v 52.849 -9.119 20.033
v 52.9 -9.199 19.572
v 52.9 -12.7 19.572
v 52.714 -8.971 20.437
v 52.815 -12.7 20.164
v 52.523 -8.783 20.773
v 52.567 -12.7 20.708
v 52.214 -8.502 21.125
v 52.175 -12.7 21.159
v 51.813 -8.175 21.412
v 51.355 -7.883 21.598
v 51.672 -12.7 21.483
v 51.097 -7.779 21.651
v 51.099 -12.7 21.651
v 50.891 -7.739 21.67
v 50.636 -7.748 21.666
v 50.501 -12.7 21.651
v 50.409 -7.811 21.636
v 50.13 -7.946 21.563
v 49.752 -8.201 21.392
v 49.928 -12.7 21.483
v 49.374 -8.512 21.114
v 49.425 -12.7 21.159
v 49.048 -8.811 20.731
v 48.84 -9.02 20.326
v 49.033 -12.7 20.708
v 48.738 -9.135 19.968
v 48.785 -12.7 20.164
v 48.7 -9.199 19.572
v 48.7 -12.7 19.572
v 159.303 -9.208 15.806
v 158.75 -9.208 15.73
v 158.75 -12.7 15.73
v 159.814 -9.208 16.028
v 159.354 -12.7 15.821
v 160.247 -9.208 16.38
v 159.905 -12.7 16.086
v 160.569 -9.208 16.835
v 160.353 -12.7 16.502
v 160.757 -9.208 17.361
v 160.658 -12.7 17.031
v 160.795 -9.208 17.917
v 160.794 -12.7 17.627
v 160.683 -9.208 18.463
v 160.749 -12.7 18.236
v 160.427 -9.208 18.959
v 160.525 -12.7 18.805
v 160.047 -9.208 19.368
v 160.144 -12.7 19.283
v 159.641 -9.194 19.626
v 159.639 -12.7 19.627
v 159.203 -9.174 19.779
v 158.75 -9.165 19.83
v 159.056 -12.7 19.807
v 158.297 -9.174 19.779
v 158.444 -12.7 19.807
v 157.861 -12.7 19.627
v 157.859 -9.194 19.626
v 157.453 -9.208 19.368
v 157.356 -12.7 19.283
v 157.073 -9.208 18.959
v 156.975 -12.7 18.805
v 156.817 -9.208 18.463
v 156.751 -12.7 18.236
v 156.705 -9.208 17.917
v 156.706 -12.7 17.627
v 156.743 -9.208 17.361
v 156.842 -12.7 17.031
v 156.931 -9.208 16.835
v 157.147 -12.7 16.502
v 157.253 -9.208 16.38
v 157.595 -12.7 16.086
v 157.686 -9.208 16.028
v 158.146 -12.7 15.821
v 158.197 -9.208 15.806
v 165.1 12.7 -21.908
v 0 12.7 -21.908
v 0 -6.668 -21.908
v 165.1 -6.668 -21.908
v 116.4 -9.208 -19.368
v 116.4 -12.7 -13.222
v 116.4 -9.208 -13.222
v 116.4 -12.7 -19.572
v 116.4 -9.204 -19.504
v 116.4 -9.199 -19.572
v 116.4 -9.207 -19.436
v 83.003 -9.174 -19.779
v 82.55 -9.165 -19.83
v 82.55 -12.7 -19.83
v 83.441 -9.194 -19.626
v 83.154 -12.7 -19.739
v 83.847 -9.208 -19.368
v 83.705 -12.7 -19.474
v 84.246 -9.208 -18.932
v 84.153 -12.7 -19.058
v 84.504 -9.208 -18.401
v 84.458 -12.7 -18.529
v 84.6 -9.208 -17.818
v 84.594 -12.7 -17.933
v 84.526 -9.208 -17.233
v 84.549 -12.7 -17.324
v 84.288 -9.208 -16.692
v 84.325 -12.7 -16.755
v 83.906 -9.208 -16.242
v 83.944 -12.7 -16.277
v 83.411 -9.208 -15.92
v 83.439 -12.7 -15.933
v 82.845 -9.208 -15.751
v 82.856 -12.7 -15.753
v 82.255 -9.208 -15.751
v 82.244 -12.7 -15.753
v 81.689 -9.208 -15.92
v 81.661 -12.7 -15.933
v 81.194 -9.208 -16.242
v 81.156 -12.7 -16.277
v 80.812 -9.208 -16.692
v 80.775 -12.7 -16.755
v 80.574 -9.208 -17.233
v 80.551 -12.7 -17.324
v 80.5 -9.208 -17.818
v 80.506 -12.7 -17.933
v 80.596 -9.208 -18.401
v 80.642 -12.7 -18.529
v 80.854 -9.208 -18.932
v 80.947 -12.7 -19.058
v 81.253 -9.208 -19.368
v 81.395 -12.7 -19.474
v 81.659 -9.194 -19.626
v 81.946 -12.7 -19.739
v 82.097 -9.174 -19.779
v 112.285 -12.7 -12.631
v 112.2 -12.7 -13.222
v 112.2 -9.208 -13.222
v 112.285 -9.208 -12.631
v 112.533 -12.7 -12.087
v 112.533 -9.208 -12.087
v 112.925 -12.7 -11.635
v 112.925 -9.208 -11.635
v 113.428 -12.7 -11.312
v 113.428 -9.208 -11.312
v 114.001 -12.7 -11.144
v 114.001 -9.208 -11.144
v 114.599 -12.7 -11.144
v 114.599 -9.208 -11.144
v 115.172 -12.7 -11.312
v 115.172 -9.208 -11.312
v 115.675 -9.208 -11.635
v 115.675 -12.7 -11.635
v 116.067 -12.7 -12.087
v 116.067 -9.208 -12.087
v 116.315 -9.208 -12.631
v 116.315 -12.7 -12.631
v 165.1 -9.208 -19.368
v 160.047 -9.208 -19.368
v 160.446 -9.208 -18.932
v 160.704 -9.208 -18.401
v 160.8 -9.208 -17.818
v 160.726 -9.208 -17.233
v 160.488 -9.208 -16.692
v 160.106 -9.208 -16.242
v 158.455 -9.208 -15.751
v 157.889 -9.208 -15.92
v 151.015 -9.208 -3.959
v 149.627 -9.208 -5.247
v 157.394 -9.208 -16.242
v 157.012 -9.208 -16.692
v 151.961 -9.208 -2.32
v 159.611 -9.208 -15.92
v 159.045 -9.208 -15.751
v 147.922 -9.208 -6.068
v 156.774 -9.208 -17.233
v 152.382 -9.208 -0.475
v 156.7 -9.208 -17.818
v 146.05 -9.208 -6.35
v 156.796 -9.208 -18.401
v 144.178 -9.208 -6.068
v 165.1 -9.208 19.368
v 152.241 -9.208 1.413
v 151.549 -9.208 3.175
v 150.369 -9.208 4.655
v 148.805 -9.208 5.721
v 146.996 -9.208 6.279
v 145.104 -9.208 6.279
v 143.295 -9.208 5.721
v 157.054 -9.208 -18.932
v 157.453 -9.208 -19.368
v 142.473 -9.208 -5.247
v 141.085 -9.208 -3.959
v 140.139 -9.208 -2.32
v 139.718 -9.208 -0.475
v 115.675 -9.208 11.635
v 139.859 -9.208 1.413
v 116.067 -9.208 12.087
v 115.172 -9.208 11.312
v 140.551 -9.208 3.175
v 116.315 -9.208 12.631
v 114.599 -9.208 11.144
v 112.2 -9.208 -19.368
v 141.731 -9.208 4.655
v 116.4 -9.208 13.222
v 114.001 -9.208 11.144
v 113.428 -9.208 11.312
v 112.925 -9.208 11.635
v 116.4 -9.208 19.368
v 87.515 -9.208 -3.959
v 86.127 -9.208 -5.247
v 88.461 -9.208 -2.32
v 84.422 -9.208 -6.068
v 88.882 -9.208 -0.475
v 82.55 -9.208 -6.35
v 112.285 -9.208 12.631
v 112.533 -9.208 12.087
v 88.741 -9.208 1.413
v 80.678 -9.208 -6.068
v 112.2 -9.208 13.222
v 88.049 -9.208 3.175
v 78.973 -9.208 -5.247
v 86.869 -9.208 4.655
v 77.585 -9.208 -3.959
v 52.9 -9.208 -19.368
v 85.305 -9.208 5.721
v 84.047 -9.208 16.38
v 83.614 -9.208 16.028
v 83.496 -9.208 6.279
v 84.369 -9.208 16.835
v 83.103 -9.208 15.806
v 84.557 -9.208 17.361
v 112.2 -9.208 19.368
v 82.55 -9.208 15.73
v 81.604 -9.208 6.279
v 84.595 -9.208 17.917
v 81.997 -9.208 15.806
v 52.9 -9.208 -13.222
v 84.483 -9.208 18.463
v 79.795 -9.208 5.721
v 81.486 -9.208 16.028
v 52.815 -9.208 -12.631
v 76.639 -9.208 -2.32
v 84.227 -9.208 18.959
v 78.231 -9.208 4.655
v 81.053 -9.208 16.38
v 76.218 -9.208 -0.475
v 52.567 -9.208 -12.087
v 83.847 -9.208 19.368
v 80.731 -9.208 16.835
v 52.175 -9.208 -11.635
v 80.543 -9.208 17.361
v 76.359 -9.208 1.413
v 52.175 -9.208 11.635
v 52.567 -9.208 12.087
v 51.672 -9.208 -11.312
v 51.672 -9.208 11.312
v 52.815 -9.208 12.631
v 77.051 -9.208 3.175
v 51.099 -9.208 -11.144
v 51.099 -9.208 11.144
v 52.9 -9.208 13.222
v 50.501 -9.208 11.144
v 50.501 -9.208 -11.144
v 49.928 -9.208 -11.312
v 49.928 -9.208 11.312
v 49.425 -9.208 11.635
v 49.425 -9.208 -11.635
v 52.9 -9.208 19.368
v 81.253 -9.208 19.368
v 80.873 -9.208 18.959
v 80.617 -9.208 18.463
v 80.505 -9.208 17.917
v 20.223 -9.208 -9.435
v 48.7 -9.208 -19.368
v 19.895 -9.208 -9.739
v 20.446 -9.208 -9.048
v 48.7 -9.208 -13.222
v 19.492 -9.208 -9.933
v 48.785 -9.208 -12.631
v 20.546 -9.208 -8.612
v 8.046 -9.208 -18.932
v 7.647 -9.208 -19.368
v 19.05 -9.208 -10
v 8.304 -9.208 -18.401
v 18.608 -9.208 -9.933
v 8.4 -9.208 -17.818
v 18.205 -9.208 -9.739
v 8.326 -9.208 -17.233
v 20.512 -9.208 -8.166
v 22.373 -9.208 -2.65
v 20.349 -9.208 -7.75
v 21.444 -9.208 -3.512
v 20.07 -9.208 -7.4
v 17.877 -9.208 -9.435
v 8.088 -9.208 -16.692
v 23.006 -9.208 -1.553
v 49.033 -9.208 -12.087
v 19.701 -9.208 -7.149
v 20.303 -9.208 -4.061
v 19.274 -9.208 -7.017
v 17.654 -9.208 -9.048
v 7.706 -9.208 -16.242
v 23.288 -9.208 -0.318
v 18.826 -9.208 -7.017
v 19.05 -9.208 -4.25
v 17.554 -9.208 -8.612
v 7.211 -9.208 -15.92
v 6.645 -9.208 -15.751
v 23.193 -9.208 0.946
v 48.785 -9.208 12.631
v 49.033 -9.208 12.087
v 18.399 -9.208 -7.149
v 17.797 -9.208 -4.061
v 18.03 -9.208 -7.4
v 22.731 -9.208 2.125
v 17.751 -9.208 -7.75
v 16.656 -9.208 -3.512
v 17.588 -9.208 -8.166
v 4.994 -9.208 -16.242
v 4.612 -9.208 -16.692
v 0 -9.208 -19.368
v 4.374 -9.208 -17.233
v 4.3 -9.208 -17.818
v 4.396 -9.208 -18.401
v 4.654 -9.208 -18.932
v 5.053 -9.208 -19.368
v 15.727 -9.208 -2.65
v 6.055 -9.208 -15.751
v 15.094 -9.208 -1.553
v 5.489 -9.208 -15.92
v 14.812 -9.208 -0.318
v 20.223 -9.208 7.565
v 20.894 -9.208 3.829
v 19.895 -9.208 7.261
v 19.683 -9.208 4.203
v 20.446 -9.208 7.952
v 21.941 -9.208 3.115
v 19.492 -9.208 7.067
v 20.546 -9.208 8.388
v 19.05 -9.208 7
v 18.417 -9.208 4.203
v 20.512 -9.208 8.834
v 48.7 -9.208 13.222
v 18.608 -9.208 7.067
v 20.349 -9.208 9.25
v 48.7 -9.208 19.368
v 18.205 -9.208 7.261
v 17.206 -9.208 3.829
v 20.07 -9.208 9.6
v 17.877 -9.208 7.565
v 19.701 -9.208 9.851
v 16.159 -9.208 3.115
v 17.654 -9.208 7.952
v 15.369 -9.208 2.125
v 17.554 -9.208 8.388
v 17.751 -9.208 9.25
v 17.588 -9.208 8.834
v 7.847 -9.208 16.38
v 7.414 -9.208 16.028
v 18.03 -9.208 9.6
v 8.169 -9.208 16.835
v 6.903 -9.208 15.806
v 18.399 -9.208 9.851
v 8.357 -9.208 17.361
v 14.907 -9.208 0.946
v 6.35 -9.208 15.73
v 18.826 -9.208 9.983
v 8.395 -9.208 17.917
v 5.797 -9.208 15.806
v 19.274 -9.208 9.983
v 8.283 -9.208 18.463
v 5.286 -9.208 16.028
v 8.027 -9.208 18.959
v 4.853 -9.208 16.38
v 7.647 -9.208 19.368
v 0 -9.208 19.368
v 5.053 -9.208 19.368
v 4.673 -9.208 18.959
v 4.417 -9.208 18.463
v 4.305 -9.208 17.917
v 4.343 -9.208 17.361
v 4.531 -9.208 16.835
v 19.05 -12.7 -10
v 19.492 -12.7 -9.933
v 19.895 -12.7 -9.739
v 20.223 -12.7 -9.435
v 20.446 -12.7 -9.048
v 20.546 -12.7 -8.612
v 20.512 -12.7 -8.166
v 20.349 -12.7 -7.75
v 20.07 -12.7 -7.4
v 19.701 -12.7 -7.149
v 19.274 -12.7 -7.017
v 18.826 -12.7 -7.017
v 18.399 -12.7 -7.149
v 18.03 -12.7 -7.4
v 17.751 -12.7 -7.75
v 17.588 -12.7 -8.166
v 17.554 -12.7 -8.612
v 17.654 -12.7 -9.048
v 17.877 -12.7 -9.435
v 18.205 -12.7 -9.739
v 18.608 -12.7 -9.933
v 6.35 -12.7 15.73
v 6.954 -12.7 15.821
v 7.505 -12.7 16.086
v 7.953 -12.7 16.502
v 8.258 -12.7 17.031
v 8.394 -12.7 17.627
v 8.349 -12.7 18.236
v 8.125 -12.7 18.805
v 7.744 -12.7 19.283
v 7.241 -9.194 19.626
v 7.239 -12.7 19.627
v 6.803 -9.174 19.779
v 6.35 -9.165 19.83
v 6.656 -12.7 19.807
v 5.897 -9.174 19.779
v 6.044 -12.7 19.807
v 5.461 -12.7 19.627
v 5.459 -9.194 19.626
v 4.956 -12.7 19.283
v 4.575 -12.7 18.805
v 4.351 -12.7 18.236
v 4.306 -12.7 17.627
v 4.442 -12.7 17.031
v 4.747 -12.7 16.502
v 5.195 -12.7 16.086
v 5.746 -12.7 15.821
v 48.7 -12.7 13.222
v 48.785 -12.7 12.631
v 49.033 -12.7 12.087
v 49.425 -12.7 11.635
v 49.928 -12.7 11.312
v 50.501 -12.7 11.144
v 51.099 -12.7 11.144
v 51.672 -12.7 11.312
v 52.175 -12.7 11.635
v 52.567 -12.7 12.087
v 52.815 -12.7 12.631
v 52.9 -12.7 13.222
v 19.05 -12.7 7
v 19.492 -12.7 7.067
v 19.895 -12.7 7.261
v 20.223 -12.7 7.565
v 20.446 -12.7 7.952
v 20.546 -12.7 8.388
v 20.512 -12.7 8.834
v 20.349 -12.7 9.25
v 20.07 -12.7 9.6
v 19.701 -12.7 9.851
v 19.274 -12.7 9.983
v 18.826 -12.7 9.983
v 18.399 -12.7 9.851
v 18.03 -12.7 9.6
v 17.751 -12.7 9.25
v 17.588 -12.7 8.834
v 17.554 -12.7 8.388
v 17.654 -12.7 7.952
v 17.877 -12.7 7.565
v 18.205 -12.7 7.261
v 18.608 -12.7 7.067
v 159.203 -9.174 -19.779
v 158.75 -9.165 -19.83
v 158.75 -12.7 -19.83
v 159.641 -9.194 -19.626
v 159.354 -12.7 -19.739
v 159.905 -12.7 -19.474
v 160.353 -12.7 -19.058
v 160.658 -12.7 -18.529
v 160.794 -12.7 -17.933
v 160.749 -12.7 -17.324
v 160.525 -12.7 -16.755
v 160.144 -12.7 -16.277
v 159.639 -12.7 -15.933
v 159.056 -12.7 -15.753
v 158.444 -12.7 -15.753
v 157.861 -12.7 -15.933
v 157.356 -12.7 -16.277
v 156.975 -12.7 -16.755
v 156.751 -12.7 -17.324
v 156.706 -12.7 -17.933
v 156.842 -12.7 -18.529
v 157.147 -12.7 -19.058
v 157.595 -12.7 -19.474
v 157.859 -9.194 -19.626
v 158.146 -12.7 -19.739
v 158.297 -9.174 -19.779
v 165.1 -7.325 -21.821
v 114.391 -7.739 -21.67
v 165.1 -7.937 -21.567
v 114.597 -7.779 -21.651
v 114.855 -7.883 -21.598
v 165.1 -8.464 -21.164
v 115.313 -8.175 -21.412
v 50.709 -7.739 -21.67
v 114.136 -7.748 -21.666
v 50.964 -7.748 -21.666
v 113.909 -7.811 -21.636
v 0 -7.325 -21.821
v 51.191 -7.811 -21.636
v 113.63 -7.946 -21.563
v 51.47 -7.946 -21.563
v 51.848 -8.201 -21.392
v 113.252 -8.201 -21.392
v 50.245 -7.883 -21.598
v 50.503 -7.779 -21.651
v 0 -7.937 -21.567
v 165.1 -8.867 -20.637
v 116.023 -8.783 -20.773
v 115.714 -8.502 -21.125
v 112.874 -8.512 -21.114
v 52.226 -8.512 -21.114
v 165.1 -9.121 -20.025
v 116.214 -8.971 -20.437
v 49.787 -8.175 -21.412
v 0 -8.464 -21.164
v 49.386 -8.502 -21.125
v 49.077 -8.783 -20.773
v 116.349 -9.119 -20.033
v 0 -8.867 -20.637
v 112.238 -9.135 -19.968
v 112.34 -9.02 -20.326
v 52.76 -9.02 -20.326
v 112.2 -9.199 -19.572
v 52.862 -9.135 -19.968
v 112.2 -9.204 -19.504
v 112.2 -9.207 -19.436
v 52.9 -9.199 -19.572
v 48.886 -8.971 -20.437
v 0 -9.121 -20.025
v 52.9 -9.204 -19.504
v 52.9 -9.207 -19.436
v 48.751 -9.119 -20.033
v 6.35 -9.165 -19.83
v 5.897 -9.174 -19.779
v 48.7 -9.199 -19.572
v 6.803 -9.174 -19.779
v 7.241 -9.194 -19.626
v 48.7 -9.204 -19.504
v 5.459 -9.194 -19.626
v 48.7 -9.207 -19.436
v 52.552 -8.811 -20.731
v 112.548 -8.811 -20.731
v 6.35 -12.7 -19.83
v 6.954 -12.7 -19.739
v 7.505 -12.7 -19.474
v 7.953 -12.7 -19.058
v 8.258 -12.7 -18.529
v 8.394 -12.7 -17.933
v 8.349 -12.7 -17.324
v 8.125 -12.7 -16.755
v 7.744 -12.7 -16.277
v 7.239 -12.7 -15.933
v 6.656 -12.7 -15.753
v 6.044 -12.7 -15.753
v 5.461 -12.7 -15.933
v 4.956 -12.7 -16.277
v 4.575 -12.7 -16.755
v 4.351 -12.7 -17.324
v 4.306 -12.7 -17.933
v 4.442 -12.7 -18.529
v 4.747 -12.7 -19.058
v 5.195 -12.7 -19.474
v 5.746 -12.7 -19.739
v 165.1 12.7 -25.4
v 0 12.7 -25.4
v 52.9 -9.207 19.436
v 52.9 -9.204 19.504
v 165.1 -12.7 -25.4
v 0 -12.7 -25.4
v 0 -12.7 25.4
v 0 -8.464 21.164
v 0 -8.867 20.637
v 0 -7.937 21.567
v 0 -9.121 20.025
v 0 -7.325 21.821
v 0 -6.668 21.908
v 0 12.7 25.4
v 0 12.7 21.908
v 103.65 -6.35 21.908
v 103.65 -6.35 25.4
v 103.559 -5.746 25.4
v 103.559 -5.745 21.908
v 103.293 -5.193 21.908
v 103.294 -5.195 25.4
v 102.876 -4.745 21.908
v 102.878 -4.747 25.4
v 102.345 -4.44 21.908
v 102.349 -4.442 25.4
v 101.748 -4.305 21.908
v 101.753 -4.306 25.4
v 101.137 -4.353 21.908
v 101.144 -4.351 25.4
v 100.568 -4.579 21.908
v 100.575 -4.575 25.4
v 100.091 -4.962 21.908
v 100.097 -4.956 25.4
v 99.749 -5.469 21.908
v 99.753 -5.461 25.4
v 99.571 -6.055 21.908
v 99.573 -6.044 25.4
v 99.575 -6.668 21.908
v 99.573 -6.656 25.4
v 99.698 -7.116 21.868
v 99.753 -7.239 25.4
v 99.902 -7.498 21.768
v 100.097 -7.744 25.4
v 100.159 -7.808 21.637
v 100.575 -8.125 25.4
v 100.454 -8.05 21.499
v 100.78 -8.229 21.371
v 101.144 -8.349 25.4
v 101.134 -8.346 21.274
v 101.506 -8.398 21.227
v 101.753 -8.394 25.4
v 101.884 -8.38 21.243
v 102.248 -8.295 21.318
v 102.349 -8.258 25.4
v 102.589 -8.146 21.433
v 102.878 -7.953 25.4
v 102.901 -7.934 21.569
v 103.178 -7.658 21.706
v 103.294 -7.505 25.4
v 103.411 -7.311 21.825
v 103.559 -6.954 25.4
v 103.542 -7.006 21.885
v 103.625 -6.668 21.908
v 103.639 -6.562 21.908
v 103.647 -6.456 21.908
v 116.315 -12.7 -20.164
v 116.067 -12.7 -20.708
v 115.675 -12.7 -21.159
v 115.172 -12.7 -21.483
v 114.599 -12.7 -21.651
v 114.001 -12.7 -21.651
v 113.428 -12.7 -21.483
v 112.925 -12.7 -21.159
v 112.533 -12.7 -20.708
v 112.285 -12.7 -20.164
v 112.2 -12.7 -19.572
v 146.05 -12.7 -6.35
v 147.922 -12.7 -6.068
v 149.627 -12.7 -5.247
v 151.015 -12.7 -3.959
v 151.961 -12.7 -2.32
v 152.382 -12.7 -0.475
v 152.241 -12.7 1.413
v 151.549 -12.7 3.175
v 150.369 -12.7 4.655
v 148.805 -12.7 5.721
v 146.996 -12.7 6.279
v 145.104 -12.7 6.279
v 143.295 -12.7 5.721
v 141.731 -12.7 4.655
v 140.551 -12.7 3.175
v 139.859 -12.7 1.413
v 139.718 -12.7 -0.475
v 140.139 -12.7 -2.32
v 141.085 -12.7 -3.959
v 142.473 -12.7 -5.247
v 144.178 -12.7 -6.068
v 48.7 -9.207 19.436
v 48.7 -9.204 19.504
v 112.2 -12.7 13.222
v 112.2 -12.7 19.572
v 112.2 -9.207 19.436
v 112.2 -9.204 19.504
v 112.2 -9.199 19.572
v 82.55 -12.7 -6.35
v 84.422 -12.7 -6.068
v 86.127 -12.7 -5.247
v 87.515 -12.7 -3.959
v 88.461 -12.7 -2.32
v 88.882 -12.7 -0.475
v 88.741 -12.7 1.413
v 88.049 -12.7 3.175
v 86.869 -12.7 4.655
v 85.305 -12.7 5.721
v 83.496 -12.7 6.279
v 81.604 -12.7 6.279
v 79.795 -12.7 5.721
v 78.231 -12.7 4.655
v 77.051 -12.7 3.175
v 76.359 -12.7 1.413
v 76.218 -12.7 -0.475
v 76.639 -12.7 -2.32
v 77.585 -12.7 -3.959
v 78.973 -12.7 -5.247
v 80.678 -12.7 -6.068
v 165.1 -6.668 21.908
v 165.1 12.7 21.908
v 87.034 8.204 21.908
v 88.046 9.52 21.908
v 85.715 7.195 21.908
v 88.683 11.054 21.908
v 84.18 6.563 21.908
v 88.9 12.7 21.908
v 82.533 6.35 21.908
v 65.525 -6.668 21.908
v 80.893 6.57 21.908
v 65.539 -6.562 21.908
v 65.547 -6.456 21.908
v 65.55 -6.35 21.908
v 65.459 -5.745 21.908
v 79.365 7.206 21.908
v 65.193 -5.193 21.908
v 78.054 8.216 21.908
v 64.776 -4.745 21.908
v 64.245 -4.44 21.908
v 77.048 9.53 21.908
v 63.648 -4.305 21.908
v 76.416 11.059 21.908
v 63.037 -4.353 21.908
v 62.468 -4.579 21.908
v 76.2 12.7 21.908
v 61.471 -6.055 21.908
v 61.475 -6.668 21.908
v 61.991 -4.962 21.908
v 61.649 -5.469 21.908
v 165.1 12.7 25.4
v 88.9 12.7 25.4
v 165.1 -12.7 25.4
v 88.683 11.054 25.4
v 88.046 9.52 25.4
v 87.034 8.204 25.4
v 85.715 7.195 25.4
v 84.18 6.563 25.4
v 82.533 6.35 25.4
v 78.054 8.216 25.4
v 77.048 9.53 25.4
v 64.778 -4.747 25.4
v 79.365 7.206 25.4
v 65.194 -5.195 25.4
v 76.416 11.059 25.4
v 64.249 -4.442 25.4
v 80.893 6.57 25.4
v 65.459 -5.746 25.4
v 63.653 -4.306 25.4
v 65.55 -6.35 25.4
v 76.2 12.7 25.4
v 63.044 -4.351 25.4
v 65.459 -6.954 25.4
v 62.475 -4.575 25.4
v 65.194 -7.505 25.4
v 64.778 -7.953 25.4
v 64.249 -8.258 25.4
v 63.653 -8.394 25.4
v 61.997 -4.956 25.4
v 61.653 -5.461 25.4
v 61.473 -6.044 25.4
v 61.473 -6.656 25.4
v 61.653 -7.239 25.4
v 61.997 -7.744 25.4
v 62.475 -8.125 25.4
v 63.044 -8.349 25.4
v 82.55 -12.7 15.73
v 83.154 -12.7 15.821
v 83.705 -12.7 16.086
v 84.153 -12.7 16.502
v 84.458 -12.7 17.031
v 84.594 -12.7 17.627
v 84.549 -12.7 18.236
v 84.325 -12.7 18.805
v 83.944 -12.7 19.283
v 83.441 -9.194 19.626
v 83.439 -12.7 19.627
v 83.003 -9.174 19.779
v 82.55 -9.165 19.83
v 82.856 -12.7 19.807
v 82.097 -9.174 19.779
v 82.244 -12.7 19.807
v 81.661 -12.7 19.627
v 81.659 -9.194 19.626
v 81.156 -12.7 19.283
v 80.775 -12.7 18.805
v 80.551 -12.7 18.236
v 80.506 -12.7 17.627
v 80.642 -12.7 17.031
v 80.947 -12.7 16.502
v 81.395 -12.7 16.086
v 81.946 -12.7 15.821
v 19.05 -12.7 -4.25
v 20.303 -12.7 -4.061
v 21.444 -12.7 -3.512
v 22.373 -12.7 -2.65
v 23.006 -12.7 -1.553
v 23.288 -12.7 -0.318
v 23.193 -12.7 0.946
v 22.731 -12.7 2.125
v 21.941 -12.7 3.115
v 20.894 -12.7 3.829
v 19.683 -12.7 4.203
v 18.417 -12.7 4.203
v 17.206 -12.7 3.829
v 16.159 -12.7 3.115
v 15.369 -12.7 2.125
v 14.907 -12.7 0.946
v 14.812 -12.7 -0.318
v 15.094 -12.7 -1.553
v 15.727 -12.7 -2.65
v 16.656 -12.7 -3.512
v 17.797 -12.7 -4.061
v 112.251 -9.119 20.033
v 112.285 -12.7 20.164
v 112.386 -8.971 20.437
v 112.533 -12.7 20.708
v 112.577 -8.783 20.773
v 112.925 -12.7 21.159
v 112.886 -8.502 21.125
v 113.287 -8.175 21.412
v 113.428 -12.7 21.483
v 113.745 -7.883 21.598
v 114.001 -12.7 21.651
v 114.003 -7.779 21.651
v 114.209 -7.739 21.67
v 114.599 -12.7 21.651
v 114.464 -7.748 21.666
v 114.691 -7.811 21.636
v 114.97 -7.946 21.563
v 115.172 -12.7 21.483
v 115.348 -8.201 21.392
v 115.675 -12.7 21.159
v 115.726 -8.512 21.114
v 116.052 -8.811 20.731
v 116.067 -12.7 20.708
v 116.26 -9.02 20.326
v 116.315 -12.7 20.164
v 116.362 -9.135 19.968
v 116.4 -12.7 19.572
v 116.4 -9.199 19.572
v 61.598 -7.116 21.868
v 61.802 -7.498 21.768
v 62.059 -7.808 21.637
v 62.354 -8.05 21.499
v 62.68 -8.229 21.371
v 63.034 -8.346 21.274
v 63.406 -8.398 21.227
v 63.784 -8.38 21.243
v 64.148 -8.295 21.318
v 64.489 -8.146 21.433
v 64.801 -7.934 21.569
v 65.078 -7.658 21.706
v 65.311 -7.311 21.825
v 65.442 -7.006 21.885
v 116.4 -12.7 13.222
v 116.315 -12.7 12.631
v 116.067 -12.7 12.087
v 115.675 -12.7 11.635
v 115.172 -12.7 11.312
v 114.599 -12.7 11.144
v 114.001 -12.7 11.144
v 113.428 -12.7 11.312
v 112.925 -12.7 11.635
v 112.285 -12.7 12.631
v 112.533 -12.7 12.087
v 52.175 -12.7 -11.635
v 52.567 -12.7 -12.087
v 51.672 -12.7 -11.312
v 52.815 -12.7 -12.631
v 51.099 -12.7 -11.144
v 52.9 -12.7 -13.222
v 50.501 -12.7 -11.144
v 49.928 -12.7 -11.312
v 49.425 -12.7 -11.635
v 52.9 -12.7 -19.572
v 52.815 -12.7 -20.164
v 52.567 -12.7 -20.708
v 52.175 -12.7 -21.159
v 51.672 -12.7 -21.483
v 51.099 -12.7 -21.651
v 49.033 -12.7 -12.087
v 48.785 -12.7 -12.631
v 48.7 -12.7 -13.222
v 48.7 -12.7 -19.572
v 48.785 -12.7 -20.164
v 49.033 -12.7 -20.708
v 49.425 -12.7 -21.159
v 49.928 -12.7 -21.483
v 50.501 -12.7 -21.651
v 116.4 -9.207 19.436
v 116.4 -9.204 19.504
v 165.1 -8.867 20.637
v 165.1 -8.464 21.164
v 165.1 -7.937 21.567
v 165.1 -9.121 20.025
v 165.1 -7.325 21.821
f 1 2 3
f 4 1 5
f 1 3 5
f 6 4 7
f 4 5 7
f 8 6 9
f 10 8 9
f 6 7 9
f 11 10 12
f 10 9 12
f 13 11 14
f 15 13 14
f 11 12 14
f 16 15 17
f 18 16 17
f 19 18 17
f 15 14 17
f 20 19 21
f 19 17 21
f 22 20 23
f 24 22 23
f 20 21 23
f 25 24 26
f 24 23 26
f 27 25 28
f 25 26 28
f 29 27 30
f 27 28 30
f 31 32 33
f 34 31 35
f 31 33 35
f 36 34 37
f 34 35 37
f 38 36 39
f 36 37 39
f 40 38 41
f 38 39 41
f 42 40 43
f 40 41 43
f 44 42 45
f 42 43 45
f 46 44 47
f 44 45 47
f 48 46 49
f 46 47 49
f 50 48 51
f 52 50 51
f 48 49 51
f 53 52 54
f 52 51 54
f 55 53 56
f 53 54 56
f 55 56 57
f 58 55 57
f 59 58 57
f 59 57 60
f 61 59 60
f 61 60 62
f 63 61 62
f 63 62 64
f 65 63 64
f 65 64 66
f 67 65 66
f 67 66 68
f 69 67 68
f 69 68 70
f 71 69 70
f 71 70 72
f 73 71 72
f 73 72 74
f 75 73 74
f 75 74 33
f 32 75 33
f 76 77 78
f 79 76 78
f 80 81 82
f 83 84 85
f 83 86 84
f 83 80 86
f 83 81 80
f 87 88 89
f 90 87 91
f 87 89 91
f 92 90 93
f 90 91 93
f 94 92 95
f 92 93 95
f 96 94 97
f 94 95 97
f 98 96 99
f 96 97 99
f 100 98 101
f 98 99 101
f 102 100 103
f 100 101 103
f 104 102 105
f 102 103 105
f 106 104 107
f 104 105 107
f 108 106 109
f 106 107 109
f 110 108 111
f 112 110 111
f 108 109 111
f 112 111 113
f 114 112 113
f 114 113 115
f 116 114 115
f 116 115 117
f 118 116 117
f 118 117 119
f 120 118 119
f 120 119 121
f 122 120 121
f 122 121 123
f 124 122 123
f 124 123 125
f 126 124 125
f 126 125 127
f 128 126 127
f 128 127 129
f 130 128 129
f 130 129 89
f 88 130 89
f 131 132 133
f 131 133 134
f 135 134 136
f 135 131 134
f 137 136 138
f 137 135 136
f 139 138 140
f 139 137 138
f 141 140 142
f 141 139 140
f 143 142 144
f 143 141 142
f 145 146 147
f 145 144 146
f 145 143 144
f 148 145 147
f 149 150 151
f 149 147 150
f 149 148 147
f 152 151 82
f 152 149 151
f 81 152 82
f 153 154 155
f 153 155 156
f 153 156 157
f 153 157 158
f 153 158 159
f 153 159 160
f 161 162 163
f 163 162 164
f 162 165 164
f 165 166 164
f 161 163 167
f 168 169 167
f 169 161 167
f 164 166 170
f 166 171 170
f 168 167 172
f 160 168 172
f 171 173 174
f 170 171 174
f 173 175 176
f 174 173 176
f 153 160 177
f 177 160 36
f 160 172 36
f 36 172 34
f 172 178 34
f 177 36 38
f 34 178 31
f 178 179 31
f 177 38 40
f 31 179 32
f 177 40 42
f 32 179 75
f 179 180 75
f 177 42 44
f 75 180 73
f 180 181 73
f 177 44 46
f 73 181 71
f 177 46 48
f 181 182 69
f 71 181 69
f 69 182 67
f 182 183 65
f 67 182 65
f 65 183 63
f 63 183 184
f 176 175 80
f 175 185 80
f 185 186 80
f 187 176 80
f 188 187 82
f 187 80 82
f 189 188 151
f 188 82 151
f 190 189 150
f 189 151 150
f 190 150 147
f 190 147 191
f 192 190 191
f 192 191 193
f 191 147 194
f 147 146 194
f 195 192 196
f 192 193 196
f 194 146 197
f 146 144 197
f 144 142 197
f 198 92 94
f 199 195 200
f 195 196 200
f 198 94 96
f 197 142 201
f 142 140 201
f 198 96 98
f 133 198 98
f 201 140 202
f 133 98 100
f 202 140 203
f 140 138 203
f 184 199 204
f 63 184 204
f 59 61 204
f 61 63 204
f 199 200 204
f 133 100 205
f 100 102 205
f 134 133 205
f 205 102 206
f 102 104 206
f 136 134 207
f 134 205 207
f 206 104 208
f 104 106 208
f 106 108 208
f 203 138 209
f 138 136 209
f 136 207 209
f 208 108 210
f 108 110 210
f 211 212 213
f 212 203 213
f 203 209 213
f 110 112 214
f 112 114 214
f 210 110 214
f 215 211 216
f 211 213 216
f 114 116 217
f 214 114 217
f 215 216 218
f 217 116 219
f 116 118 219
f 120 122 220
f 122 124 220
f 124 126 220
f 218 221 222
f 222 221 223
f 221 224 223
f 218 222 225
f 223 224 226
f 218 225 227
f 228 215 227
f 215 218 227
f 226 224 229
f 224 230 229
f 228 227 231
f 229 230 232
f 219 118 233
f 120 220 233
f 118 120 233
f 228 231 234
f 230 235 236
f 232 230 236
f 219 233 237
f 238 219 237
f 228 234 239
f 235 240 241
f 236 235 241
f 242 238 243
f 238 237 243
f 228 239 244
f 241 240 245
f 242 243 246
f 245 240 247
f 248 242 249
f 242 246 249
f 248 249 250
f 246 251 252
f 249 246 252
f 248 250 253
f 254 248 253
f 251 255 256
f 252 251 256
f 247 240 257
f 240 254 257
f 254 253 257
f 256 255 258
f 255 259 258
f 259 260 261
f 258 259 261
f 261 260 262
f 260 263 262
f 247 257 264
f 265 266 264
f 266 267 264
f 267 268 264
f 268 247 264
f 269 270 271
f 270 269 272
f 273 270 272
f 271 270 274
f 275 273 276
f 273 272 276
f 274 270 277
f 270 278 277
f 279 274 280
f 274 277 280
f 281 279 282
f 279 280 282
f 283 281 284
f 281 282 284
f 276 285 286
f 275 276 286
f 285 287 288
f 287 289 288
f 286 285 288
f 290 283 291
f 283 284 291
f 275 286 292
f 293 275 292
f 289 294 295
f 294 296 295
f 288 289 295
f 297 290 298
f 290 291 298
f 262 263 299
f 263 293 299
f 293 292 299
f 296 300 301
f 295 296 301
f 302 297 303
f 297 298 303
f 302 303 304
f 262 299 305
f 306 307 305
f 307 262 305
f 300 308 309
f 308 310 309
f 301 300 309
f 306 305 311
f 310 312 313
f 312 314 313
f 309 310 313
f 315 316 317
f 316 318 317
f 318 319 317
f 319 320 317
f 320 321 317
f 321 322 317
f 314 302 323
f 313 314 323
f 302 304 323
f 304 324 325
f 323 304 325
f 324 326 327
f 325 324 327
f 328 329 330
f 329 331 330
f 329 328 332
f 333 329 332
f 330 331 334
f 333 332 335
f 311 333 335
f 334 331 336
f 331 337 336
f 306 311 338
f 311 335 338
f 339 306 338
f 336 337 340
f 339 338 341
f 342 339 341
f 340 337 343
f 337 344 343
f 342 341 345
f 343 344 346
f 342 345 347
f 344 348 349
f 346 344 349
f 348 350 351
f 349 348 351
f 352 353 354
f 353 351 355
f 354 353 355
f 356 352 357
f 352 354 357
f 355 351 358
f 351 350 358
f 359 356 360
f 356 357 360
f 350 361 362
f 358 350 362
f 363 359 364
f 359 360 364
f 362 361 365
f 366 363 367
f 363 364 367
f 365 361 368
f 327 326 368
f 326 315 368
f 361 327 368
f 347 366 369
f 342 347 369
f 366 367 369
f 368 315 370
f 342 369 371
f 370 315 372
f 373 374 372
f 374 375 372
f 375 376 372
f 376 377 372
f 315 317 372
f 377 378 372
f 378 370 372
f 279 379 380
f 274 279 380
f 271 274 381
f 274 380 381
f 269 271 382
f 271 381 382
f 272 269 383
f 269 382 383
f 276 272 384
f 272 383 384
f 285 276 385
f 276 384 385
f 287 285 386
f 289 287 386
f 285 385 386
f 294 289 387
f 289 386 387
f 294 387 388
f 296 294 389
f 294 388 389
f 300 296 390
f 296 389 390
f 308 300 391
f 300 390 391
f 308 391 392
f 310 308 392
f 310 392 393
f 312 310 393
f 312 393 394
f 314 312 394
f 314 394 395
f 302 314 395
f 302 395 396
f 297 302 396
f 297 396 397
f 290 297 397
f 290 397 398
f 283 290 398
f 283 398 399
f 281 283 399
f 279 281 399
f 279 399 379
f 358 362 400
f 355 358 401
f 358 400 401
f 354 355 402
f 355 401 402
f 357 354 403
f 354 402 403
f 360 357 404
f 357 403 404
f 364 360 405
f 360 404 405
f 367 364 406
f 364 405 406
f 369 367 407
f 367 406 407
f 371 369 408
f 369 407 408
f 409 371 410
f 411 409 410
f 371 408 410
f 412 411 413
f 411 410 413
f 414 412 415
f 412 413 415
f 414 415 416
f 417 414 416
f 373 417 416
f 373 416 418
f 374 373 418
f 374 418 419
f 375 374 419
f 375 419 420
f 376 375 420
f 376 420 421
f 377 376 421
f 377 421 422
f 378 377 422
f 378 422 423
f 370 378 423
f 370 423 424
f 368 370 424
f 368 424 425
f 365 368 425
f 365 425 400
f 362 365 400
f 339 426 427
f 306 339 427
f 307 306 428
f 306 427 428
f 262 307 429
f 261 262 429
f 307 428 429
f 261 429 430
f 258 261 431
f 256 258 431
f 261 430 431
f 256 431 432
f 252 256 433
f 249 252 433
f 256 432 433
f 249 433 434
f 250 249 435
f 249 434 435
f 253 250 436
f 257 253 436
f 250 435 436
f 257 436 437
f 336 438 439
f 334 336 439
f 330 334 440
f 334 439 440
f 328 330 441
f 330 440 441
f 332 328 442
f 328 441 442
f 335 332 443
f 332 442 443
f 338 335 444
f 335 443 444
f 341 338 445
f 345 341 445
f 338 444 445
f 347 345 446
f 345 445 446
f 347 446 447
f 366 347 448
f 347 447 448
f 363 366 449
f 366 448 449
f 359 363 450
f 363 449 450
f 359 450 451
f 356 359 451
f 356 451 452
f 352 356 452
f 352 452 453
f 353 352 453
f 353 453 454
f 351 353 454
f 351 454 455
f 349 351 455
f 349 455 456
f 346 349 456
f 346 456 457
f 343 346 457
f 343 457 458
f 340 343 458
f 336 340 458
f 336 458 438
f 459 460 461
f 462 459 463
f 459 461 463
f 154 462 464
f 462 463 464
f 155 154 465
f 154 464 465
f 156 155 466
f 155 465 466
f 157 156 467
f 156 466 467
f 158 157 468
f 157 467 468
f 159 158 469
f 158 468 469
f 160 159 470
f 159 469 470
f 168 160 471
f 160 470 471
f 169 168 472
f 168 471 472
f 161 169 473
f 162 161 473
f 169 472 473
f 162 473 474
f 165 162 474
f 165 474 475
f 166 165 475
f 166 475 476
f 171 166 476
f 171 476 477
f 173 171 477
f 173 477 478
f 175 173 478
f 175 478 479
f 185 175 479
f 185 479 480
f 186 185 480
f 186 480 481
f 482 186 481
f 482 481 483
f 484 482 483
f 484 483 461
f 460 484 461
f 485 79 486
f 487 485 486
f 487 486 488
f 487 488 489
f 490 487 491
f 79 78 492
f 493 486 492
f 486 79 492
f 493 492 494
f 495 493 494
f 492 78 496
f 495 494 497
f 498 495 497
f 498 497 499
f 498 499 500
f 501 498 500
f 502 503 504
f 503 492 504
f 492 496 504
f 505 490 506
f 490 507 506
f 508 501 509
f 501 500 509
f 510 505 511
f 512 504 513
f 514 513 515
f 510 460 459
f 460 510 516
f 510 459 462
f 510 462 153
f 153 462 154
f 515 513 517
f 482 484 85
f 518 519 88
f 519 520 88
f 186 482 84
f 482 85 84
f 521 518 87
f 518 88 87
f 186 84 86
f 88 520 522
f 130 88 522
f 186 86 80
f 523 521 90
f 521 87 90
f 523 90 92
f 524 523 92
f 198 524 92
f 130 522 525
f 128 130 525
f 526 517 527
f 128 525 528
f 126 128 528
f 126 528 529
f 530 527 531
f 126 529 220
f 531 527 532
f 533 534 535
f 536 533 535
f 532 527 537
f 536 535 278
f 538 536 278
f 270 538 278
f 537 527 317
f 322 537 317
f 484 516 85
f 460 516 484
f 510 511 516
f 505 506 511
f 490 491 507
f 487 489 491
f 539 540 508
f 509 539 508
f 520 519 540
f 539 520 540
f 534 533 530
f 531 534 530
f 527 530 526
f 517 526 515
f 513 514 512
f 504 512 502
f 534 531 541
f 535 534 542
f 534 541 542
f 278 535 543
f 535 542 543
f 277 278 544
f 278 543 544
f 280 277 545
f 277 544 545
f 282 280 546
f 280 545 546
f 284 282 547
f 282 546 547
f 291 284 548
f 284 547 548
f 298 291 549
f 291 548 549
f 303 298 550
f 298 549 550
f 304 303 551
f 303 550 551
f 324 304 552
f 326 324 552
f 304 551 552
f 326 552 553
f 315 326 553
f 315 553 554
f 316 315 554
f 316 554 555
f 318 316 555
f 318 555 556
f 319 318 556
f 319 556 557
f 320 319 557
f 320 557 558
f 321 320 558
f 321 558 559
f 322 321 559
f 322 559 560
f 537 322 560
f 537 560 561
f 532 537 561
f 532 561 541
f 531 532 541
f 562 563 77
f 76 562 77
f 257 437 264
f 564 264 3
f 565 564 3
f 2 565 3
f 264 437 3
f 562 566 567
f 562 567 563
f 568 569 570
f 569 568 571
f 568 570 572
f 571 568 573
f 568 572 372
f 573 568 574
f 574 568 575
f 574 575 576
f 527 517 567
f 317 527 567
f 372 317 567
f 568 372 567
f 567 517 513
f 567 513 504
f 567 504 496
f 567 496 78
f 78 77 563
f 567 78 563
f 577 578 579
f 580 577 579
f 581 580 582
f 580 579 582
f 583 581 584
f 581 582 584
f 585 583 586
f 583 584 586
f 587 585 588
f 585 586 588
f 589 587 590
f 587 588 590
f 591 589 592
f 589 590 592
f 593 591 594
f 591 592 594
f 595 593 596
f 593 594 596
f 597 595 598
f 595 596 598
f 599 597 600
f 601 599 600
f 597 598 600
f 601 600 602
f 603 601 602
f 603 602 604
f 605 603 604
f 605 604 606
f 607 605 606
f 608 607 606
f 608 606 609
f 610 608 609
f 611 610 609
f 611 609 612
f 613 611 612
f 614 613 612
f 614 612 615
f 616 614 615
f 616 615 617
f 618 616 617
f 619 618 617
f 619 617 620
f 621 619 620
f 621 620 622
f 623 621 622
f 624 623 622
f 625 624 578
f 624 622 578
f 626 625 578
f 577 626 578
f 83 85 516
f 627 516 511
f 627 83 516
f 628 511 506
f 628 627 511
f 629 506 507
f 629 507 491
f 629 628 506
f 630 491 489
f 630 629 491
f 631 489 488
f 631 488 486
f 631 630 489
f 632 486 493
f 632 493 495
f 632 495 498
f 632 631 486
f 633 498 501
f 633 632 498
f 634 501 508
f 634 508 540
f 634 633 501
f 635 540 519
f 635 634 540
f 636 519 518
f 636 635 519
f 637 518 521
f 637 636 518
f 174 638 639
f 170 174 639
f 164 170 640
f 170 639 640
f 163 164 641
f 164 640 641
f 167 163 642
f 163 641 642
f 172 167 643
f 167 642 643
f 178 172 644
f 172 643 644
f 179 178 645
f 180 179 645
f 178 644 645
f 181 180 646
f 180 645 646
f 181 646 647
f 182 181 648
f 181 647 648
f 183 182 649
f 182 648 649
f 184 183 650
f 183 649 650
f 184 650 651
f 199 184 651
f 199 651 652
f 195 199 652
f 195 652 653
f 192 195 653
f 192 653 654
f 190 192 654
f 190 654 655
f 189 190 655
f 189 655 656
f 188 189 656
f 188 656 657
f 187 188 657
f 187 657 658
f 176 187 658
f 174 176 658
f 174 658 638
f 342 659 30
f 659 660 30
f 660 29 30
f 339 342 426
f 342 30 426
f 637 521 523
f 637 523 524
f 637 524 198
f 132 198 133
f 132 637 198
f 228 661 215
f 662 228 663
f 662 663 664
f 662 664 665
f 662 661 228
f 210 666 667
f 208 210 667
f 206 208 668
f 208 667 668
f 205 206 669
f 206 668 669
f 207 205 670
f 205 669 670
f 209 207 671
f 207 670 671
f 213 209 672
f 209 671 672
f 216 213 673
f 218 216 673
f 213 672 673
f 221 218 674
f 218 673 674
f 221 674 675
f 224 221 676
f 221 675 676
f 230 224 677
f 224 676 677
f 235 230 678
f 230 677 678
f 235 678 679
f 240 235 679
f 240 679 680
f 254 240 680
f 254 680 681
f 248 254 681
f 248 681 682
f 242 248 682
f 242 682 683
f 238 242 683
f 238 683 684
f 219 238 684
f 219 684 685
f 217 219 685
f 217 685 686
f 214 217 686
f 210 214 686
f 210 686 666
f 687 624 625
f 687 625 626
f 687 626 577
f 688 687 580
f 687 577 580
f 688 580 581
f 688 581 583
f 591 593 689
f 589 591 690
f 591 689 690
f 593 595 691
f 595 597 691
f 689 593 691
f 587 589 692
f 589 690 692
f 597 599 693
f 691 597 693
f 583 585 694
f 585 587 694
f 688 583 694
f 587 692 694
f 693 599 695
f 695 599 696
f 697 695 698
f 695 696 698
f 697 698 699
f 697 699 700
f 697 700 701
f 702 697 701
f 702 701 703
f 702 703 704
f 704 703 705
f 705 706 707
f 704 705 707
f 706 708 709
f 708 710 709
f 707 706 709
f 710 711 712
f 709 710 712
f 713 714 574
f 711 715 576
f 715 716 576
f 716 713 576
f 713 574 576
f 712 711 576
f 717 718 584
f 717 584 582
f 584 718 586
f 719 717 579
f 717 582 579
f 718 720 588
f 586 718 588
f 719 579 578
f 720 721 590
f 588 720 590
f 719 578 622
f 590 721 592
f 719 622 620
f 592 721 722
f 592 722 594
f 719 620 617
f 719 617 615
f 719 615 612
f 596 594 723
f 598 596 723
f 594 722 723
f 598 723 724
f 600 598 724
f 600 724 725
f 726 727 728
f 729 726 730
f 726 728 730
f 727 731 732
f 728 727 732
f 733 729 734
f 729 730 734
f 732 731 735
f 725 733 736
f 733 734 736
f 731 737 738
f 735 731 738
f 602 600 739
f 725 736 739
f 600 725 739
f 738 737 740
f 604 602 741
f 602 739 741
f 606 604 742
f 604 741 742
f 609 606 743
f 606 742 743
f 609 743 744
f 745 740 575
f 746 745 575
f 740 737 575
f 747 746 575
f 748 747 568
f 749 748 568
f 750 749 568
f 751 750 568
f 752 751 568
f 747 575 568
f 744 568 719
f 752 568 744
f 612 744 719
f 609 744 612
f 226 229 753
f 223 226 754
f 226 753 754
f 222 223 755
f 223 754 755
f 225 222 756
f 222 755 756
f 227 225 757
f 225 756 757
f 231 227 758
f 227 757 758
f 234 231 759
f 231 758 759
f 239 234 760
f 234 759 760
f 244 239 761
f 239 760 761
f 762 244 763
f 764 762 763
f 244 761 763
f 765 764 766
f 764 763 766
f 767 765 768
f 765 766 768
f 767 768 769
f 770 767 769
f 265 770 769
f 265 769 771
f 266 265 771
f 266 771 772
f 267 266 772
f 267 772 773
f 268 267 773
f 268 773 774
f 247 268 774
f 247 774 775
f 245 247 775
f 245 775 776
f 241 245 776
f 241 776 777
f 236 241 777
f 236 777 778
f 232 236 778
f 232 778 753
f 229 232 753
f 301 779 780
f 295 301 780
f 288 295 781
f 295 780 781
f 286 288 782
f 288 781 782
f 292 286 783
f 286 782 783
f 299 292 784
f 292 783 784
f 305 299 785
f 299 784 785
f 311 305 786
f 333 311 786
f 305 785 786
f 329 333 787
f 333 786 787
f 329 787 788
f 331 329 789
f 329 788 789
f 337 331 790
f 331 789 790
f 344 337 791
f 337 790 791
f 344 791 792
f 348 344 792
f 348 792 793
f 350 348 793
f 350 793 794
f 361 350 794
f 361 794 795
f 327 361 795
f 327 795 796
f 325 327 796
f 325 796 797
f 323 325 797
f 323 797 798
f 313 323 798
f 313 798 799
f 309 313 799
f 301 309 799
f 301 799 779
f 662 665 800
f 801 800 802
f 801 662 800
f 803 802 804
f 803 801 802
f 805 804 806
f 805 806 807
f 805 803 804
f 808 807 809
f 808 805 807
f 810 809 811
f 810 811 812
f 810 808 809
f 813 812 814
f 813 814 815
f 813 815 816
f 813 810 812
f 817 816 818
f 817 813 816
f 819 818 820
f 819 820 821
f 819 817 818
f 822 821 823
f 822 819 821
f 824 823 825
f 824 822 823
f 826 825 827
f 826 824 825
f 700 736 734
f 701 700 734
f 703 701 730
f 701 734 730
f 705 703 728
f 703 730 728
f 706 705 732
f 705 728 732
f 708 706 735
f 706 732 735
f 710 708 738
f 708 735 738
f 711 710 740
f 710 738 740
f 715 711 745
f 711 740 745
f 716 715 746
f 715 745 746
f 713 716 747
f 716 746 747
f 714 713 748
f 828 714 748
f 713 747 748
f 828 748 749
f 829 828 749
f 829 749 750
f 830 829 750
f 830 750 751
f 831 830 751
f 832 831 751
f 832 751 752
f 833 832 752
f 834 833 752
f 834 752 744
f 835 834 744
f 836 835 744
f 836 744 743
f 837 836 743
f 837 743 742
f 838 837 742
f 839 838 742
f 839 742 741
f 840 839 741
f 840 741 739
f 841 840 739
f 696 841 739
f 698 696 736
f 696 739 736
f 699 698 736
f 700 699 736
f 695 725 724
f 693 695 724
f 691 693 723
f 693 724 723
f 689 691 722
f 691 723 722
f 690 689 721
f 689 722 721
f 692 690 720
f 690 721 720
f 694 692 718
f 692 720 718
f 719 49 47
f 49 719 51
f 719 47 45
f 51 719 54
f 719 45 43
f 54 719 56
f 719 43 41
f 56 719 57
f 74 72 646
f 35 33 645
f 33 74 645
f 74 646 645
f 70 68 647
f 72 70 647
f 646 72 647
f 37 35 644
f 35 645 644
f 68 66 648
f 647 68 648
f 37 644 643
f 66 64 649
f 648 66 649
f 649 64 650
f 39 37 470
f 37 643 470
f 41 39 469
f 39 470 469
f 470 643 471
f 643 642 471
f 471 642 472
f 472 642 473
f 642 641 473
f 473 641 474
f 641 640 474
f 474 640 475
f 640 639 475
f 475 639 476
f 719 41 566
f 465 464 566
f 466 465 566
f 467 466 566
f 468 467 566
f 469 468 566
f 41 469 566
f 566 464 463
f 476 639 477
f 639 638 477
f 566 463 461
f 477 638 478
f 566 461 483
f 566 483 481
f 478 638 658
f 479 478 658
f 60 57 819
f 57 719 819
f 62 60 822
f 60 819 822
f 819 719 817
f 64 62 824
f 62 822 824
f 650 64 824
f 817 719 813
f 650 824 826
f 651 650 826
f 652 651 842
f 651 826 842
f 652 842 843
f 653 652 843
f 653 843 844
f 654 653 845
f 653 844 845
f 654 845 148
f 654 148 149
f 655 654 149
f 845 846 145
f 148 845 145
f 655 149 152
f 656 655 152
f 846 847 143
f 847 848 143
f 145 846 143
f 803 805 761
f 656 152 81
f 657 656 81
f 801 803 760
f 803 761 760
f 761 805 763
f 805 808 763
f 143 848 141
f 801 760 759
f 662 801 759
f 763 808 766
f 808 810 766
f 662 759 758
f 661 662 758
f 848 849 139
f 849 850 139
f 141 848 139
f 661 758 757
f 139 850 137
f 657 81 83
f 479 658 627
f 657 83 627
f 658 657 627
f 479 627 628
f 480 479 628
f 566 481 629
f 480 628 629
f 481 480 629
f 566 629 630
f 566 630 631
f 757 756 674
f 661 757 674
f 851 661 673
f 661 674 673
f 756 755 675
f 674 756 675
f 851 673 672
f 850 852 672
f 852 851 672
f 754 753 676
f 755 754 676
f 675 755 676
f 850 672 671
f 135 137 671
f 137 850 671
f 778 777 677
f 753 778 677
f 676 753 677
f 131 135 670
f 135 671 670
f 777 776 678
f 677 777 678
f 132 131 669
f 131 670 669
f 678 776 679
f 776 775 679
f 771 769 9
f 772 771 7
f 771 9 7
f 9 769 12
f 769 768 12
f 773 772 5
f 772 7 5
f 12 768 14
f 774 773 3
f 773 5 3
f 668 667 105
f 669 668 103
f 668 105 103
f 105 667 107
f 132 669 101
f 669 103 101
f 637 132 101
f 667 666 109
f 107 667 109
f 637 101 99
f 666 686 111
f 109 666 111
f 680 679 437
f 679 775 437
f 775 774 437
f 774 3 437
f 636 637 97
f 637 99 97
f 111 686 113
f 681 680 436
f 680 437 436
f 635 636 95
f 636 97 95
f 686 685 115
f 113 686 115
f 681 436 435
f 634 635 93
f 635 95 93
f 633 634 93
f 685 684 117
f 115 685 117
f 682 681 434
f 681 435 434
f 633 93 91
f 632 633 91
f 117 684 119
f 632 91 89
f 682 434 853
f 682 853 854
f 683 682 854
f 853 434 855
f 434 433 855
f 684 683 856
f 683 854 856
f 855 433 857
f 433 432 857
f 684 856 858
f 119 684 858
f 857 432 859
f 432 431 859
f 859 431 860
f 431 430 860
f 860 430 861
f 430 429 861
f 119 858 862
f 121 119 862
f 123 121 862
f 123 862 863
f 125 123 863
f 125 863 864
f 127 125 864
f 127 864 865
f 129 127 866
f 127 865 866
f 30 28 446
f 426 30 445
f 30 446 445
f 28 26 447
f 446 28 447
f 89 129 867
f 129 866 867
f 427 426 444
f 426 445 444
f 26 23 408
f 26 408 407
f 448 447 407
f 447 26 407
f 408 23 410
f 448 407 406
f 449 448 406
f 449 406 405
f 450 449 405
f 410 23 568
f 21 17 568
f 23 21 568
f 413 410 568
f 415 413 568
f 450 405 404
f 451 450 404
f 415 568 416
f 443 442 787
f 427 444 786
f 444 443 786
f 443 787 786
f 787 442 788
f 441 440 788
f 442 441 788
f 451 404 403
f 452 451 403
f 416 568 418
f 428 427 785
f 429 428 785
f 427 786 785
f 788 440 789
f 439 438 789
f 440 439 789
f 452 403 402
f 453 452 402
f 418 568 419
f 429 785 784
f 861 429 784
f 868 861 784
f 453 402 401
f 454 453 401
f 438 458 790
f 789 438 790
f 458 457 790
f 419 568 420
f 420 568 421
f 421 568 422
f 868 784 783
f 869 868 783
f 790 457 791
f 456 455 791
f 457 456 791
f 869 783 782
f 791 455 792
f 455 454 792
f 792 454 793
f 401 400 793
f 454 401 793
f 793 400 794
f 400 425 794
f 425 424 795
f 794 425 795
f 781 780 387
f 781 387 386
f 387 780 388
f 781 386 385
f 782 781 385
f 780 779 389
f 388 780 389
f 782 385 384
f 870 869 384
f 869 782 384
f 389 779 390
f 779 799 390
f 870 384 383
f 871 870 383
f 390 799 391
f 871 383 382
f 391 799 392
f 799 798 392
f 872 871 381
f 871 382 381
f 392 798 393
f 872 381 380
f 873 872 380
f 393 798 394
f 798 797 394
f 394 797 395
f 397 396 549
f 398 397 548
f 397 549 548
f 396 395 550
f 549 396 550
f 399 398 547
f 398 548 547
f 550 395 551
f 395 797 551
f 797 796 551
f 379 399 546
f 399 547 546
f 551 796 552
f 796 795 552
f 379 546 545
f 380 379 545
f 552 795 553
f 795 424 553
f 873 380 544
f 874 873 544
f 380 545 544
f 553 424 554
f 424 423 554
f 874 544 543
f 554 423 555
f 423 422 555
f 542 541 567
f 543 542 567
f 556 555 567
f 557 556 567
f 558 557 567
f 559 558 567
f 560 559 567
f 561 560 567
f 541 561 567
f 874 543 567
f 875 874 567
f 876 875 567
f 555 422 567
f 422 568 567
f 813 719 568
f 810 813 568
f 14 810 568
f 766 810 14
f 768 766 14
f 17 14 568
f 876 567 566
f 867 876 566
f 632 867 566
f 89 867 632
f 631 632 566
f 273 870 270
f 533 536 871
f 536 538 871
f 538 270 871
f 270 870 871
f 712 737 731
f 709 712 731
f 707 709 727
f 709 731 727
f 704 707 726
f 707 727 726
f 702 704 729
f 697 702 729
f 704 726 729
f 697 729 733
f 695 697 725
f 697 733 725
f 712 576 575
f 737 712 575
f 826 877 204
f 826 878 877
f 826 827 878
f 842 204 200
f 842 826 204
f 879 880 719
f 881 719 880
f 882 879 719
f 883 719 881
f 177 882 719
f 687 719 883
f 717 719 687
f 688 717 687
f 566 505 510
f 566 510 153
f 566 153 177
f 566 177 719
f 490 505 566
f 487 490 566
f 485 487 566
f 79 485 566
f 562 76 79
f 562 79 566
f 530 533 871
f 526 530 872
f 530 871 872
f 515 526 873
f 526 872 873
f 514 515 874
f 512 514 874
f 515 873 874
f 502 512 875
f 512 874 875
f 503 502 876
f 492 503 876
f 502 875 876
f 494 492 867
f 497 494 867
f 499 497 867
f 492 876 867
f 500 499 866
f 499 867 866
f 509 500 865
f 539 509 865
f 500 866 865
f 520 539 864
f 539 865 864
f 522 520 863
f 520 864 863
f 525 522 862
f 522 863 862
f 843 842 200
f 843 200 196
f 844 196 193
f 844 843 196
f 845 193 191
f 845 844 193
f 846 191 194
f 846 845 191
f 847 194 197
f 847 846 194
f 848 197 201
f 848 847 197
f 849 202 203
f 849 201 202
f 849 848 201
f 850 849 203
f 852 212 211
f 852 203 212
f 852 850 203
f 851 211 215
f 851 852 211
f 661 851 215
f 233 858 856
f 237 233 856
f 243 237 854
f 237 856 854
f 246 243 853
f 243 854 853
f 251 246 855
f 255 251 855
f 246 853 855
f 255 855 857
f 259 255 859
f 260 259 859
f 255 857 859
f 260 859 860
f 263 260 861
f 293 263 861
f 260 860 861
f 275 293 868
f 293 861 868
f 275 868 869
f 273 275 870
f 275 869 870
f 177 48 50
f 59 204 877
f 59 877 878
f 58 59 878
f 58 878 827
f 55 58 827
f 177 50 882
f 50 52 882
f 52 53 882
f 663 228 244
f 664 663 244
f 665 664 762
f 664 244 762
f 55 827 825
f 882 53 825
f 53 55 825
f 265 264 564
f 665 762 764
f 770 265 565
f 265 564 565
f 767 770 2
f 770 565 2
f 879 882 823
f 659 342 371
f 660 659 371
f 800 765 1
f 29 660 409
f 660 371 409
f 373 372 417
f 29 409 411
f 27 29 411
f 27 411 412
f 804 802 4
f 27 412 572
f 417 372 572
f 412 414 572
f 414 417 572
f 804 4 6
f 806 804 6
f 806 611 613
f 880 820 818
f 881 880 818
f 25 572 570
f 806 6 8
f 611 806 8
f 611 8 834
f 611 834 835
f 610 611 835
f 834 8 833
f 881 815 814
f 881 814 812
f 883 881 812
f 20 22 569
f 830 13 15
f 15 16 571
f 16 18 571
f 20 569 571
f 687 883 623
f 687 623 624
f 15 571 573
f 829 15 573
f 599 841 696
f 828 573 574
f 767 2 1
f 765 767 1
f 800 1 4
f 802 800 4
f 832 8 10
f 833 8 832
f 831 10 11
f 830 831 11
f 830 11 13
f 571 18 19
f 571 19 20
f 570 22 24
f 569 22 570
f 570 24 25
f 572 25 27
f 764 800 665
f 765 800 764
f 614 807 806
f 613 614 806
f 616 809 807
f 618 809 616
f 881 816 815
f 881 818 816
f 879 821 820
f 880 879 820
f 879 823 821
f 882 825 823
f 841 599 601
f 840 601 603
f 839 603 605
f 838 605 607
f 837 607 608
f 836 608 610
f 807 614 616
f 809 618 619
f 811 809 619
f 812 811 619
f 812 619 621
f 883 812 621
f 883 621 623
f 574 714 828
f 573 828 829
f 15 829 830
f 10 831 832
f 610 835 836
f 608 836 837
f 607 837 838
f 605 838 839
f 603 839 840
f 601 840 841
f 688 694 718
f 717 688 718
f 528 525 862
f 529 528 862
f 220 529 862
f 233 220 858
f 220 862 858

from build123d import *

# Parameters (mm, degrees)
BOSS_EXTRUDE1_DEPTH = 165.1
SKETCH2_R           = 4.25
SKETCH2_R_2         = 6.35
SKETCH2_R_3         = 1.5
CUT_EXTRUDE1_DEPTH  = 11.938
SKETCH3_R           = 2.1
CUT_EXTRUDE2_DEPTH  = 7.874
CUT_EXTRUDE3_DEPTH  = 12.446
SKETCH5_R           = 2.05
CUT_EXTRUDE4_DEPTH  = 6.35
SKETCH6_R           = 2.05
CUT_EXTRUDE5_DEPTH  = 6.35


with BuildPart() as part:
    # Sketch1 → Boss-Extrude1 (new body)
    with BuildSketch(Plane(origin=(0, 0, 0), x_dir=(0, 0, -1), z_dir=(1, 0, 0))):
        with BuildLine():
            Line((-21.9075, -6.6675), (-21.9075, 9.2075))
            Line((-21.9075, 9.2075), (-21.9075, 12.7))
            Line((-21.9075, 12.7), (-25.4, 12.7))
            Line((-25.4, 12.7), (-25.4, -12.7))
            Line((-25.4, -12.7), (25.4, -12.7))
            Line((25.4, -12.7), (25.4, 12.7))
            Line((25.4, 12.7), (21.9075, 12.7))
            Line((21.9075, 12.7), (21.9075, 9.2075))
            Line((21.9075, 9.2075), (21.9075, -6.6675))
            ThreePointArc((21.9075, -6.6675), (21.163551224, -8.463551224), (19.3675, -9.2075))
            Line((19.3675, -9.2075), (-19.3675, -9.2075))
            ThreePointArc((-19.3675, -9.2075), (-21.163551224, -8.463551224), (-21.9075, -6.6675))
        make_face()
    extrude(amount=BOSS_EXTRUDE1_DEPTH)

    # Sketch2 → Cut-Extrude1 (cut)
    with BuildSketch(Plane.XZ.offset(12.7)):
        with Locations(Location((19.05, 0, 0), (0, 0, 270))):
            Circle(SKETCH2_R)
        with Locations(Location((146.05, 0, 0), (0, 0, 270))):
            Circle(SKETCH2_R_2)
        with Locations(Location((19.05, 8.5, 0), (0, 0, 270))):
            Circle(SKETCH2_R_3)
        with Locations(Location((19.05, -8.5, 0), (0, 0, 270))):
            Circle(SKETCH2_R_3)
        with Locations(Location((82.55, 0, 0), (0, 0, 270))):
            Circle(SKETCH2_R_2)
    extrude(amount=-CUT_EXTRUDE1_DEPTH, mode=Mode.SUBTRACT)

    # Sketch3 → Cut-Extrude2 (cut)
    with BuildSketch(Plane.XZ.offset(12.7)):
        with BuildLine():
            Line((52.9, 16.397413762), (52.9, 19.572413762))
            ThreePointArc((52.9, 19.572413762), (50.8, 21.672413762), (48.7, 19.572413762))
            Line((48.7, 19.572413762), (48.7, 16.397413762))
            ThreePointArc((48.7, 16.397413762), (50.8, 18.497413762), (52.9, 16.397413762))
        make_face()
        with Locations((50.8, 16.397413762)):
            Circle(SKETCH3_R)
        with BuildLine():
            Line((52.9, 13.222413762), (52.9, 16.397413762))
            ThreePointArc((52.9, 16.397413762), (50.8, 14.297413762), (48.7, 16.397413762))
            Line((48.7, 16.397413762), (48.7, 13.222413762))
            ThreePointArc((48.7, 13.222413762), (50.8, 11.122413762), (52.9, 13.222413762))
        make_face()
        with BuildLine():
            ThreePointArc((116.4, 13.222413762), (114.3, 11.122413762), (112.2, 13.222413762))
            Line((112.2, 13.222413762), (112.2, 19.572413762))
            ThreePointArc((112.2, 19.572413762), (114.3, 21.672413762), (116.4, 19.572413762))
            Line((116.4, 19.572413762), (116.4, 13.222413762))
        make_face()
        with BuildLine():
            Line((52.9, -19.572413762), (52.9, -13.222413762))
            ThreePointArc((52.9, -13.222413762), (50.8, -11.122413762), (48.7, -13.222413762))
            Line((48.7, -13.222413762), (48.7, -19.572413762))
            ThreePointArc((48.7, -19.572413762), (50.8, -21.672413762), (52.9, -19.572413762))
        make_face()
        with BuildLine():
            Line((112.2, -19.572413762), (112.2, -13.222413762))
            ThreePointArc((112.2, -13.222413762), (114.3, -11.122413762), (116.4, -13.222413762))
            Line((116.4, -13.222413762), (116.4, -19.572413762))
            ThreePointArc((116.4, -19.572413762), (114.3, -21.672413762), (112.2, -19.572413762))
        make_face()
    extrude(amount=-CUT_EXTRUDE2_DEPTH, mode=Mode.SUBTRACT)

    # Sketch4 → Cut-Extrude3 (cut)
    with BuildSketch(Plane.XY.offset(25.4)):
        with BuildLine():
            ThreePointArc((76.2, 12.7), (78.053929045, 8.21582271), (82.533179833, 6.350022277))
            Line((82.533179833, 6.350022277), (82.536543857, 12.7))
            Line((82.536543857, 12.7), (76.2, 12.7))
        make_face()
        with BuildLine():
            Line((82.536543857, 12.7), (82.533179833, 6.350022277))
            ThreePointArc((82.533179833, 6.350022277), (87.03417729, 8.203929045), (88.9, 12.7))
            Line((88.9, 12.7), (82.536543857, 12.7))
        make_face()
        with BuildLine():
            Line((76.2, 12.7), (82.536543857, 12.7))
            Line((82.536543857, 12.7), (82.539907889, 19.04999198))
            ThreePointArc((82.539907889, 19.04999198), (78.056305256, 17.186558542), (76.2, 12.7))
        make_face()
        with BuildLine():
            Line((82.539907889, 19.04999198), (82.536543857, 12.7))
            Line((82.536543857, 12.7), (88.9, 12.7))
            ThreePointArc((88.9, 12.7), (87.036558542, 17.193694744), (82.539907889, 19.04999198))
        make_face()
    extrude(amount=-CUT_EXTRUDE3_DEPTH, mode=Mode.SUBTRACT)

    # Sketch5 → Cut-Extrude4 (cut)
    with BuildSketch(Plane.XZ.offset(12.7)):
        with Locations(Location((6.35, 17.78, 0), (0, 0, 270))):
            Circle(SKETCH5_R)
        with Locations(Location((6.35, -17.78, 0), (0, 0, 270))):
            Circle(SKETCH5_R)
        with Locations(Location((82.55, -17.78, 0), (0, 0, 270))):
            Circle(SKETCH5_R)
        with Locations(Location((158.75, -17.78, 0), (0, 0, 270))):
            Circle(SKETCH5_R)
        with Locations(Location((82.55, 17.78, 0), (0, 0, 270))):
            Circle(SKETCH5_R)
        with Locations(Location((158.75, 17.78, 0), (0, 0, 270))):
            Circle(SKETCH5_R)
    extrude(amount=-CUT_EXTRUDE4_DEPTH, mode=Mode.SUBTRACT)

    # Sketch6 → Cut-Extrude5 (cut)
    with BuildSketch(Plane.XY.offset(25.4)):
        with Locations((101.6, -6.35)):
            Circle(SKETCH6_R)
        with Locations((63.5, -6.35)):
            Circle(SKETCH6_R)
    extrude(amount=-CUT_EXTRUDE5_DEPTH, mode=Mode.SUBTRACT)


solid = part.part
